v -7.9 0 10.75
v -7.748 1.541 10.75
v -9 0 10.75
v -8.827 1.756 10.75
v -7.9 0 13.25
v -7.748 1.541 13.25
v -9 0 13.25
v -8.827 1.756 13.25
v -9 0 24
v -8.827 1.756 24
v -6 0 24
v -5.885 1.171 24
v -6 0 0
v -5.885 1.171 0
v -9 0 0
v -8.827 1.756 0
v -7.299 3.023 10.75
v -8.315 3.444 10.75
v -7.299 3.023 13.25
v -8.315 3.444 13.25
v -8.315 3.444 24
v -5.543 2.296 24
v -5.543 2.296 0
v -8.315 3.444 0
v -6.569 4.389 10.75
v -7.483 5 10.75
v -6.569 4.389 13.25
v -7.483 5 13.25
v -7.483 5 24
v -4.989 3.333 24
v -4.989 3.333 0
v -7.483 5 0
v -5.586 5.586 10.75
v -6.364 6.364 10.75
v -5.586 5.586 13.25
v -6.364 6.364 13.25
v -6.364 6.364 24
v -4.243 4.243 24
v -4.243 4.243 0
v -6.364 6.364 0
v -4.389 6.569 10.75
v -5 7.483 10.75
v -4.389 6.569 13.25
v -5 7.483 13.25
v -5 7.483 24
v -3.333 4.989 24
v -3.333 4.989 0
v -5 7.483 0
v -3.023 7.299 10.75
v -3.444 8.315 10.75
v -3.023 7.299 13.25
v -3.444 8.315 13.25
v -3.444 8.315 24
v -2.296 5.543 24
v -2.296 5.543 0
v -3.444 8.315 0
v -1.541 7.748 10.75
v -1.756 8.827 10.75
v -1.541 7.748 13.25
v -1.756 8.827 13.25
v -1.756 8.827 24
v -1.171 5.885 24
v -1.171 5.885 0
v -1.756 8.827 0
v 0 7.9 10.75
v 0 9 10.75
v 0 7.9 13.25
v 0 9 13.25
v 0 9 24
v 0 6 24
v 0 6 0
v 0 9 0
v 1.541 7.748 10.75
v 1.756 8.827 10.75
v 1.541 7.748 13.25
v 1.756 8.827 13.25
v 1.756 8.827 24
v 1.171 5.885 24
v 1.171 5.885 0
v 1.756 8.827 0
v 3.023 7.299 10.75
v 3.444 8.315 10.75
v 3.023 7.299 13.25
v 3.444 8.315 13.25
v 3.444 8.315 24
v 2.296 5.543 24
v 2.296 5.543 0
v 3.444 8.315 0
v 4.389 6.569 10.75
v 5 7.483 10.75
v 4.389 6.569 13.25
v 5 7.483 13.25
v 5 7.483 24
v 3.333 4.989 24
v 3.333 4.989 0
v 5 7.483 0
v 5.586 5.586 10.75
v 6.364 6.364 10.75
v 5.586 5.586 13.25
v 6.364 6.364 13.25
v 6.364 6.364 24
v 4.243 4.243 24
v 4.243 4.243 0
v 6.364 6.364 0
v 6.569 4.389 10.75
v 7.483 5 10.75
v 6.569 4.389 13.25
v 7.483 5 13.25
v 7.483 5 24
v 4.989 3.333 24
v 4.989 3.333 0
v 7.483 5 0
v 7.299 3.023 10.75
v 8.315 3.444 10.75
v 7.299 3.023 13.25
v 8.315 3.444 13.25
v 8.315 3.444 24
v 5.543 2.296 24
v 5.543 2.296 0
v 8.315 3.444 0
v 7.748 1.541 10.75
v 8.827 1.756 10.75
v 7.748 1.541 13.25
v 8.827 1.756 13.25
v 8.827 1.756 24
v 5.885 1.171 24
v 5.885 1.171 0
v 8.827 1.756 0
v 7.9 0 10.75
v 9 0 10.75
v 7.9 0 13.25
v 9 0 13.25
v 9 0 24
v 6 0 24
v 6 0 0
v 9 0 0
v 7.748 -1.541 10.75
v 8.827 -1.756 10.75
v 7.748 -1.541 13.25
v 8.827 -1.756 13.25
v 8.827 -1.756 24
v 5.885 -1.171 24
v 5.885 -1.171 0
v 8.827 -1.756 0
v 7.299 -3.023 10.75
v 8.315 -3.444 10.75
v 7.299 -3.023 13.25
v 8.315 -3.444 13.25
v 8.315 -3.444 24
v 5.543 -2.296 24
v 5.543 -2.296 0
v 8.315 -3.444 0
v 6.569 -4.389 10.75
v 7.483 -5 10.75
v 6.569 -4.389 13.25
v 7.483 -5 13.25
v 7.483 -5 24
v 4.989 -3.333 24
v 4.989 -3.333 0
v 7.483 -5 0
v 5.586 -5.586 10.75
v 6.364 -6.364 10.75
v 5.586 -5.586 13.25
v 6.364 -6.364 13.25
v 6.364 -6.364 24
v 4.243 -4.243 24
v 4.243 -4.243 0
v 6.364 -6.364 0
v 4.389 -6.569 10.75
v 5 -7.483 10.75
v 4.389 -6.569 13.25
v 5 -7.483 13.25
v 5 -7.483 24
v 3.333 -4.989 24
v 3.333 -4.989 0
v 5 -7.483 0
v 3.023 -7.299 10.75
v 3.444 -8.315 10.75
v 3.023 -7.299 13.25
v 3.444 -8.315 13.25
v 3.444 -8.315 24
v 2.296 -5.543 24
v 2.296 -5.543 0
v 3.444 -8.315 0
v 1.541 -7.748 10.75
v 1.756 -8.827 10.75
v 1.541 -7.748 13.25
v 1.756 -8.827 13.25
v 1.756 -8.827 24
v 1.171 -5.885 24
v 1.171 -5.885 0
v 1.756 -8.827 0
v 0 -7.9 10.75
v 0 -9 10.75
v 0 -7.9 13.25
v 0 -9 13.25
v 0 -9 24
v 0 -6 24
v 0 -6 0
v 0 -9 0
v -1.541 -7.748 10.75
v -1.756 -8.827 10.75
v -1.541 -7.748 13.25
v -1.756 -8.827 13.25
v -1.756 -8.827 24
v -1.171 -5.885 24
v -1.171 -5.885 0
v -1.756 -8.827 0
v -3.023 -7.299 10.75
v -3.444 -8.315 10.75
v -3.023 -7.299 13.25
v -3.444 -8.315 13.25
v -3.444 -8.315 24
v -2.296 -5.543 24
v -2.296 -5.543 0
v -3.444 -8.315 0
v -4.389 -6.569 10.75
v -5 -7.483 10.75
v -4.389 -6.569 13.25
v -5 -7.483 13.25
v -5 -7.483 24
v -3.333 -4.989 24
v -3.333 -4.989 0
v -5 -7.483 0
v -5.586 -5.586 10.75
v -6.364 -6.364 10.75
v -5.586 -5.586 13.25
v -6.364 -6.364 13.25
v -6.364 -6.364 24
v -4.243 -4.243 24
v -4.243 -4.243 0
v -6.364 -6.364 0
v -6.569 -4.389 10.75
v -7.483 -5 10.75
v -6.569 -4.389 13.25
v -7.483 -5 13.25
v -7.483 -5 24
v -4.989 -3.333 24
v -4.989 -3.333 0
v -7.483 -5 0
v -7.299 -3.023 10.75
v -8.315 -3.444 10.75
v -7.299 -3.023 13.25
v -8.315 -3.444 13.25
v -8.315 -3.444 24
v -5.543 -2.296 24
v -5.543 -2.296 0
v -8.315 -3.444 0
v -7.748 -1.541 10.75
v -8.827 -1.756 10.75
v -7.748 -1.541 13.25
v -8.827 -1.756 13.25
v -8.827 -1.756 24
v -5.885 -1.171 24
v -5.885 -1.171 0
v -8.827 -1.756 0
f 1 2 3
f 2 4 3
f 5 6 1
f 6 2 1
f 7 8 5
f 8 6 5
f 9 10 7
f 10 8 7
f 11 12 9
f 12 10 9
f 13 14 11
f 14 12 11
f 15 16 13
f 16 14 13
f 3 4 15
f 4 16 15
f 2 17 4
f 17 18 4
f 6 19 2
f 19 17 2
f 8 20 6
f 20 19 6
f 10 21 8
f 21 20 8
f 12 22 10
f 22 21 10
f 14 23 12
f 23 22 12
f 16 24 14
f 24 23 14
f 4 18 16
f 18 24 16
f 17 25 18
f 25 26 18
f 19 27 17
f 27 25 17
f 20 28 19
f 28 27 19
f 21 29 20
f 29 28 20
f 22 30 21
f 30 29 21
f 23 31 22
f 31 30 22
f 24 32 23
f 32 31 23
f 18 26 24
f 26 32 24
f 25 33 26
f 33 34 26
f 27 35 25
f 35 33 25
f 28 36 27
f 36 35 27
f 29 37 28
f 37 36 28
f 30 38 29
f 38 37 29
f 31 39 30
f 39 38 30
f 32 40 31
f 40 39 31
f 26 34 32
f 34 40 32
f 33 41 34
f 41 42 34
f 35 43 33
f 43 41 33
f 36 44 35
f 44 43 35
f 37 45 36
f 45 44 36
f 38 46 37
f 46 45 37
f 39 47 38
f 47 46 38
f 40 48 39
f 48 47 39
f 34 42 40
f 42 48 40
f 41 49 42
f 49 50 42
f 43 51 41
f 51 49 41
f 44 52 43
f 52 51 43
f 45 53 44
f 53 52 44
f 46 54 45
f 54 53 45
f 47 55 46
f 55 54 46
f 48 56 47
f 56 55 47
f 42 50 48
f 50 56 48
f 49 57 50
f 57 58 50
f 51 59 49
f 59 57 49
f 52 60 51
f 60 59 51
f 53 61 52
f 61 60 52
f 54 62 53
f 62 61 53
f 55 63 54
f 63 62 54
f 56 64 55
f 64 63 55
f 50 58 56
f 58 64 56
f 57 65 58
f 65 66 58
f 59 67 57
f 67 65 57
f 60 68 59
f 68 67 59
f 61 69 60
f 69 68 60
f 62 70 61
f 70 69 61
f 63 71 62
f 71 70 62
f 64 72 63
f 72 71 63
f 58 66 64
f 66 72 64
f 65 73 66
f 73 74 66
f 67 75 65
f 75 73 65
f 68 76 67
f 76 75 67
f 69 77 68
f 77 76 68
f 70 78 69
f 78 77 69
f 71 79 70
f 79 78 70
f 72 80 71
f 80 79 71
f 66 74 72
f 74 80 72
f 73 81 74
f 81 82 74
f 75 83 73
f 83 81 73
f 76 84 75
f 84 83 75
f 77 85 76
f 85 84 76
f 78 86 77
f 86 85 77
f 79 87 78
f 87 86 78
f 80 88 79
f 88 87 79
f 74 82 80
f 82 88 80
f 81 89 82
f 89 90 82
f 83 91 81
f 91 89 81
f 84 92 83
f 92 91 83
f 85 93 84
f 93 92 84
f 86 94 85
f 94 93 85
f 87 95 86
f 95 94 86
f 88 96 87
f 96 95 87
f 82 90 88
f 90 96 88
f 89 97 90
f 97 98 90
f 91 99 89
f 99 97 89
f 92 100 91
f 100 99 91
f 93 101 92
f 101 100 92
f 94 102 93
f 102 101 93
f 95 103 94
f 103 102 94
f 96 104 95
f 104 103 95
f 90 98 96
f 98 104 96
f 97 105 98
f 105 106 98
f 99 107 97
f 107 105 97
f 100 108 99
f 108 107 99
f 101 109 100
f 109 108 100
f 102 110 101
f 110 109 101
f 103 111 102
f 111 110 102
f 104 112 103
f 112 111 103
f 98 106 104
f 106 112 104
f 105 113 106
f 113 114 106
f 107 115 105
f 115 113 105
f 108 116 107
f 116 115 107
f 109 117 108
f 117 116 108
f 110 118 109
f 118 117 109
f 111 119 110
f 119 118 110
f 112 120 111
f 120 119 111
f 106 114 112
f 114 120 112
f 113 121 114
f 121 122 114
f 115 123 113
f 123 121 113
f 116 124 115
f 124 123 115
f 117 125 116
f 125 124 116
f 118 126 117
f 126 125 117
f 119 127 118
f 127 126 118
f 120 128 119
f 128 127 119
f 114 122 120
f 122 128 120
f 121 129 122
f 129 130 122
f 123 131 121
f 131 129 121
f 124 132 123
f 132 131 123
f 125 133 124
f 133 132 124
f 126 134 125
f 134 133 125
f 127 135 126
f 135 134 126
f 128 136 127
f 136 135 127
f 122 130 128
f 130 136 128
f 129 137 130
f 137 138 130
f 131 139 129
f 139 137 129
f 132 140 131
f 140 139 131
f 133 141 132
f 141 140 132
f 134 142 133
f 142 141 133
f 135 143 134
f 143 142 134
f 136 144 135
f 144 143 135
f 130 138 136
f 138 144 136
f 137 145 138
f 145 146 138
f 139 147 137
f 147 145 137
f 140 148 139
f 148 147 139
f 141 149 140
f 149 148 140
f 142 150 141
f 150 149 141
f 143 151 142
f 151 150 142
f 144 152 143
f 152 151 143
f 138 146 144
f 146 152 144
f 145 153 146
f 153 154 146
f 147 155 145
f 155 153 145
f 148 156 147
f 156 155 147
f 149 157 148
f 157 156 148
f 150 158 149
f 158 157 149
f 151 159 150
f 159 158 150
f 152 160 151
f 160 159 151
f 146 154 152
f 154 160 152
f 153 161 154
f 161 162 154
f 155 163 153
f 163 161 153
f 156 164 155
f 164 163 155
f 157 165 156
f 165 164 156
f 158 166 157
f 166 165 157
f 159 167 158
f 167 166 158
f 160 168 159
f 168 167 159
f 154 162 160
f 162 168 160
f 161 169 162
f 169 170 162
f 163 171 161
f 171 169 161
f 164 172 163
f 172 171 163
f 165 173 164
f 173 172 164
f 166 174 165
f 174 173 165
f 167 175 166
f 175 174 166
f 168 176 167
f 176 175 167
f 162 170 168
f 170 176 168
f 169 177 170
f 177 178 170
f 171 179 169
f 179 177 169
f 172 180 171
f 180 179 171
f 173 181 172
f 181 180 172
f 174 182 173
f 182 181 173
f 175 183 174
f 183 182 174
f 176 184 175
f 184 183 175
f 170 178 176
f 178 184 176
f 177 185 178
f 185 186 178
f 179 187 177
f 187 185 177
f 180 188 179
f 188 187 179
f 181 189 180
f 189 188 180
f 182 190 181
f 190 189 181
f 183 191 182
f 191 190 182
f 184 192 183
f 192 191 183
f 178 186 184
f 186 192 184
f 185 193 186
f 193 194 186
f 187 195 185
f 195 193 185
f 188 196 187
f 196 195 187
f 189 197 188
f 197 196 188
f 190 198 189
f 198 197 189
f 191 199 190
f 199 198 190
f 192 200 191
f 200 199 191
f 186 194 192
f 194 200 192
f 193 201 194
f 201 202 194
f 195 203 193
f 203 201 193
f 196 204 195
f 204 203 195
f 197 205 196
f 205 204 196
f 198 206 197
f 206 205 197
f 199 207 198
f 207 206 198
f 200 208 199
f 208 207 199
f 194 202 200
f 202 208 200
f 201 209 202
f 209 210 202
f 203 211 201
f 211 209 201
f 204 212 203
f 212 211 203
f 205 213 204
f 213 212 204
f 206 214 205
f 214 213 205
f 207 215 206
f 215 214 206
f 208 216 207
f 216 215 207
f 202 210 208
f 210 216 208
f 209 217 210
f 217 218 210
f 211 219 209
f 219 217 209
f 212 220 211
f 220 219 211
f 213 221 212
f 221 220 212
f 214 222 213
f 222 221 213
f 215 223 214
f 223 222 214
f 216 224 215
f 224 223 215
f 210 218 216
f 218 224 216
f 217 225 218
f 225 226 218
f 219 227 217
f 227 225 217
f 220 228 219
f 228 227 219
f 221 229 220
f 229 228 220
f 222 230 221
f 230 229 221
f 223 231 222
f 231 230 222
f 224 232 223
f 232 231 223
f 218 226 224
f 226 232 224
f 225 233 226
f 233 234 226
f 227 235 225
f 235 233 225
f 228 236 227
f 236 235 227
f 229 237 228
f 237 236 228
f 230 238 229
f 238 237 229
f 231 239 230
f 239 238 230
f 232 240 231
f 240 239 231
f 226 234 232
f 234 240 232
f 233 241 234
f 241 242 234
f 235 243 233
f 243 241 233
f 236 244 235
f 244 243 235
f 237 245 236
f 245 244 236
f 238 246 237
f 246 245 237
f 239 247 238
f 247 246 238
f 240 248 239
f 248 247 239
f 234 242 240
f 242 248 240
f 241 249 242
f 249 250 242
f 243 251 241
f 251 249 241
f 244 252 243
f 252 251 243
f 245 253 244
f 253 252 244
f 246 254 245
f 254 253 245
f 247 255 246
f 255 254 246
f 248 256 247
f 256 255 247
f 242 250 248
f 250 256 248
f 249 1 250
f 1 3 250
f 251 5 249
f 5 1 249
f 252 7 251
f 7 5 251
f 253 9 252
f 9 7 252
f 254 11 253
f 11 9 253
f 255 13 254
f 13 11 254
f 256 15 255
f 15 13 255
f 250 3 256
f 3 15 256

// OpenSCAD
$fn = 32;

// ----------------------------------------------------------------------
// Grooved revolve: stepped, bore R6
// ----------------------------------------------------------------------

// --- parameters (mm) ---
bore_r = 6;               // bore radius
outer_r = 9;              // outer radius of the body
total_h = 24;             // overall height, Z
wall = 3;                 // radial wall thickness
groove_w = 2.5;           // groove width
groove_d = 1.1;           // groove depth
grooves = 1;              // number of outer grooves

bbox_x = 2 * outer_r;  // full diameter
bore_d = 2 * bore_r;  // bore diameter
body_d = 2 * outer_r;  // body diameter
revolve_angle = 360;  // full turn around the Z axis

profile = [[6, 0], [9, 0], [9, 10.75], [7.9, 10.75], [7.9, 13.25], [9, 13.25], [9, 24], [6, 24]];  // primary outline, 8 points, counter clockwise

// --- the one profile operation ---
rotate_extrude(angle = revolve_angle) polygon(points = profile);
